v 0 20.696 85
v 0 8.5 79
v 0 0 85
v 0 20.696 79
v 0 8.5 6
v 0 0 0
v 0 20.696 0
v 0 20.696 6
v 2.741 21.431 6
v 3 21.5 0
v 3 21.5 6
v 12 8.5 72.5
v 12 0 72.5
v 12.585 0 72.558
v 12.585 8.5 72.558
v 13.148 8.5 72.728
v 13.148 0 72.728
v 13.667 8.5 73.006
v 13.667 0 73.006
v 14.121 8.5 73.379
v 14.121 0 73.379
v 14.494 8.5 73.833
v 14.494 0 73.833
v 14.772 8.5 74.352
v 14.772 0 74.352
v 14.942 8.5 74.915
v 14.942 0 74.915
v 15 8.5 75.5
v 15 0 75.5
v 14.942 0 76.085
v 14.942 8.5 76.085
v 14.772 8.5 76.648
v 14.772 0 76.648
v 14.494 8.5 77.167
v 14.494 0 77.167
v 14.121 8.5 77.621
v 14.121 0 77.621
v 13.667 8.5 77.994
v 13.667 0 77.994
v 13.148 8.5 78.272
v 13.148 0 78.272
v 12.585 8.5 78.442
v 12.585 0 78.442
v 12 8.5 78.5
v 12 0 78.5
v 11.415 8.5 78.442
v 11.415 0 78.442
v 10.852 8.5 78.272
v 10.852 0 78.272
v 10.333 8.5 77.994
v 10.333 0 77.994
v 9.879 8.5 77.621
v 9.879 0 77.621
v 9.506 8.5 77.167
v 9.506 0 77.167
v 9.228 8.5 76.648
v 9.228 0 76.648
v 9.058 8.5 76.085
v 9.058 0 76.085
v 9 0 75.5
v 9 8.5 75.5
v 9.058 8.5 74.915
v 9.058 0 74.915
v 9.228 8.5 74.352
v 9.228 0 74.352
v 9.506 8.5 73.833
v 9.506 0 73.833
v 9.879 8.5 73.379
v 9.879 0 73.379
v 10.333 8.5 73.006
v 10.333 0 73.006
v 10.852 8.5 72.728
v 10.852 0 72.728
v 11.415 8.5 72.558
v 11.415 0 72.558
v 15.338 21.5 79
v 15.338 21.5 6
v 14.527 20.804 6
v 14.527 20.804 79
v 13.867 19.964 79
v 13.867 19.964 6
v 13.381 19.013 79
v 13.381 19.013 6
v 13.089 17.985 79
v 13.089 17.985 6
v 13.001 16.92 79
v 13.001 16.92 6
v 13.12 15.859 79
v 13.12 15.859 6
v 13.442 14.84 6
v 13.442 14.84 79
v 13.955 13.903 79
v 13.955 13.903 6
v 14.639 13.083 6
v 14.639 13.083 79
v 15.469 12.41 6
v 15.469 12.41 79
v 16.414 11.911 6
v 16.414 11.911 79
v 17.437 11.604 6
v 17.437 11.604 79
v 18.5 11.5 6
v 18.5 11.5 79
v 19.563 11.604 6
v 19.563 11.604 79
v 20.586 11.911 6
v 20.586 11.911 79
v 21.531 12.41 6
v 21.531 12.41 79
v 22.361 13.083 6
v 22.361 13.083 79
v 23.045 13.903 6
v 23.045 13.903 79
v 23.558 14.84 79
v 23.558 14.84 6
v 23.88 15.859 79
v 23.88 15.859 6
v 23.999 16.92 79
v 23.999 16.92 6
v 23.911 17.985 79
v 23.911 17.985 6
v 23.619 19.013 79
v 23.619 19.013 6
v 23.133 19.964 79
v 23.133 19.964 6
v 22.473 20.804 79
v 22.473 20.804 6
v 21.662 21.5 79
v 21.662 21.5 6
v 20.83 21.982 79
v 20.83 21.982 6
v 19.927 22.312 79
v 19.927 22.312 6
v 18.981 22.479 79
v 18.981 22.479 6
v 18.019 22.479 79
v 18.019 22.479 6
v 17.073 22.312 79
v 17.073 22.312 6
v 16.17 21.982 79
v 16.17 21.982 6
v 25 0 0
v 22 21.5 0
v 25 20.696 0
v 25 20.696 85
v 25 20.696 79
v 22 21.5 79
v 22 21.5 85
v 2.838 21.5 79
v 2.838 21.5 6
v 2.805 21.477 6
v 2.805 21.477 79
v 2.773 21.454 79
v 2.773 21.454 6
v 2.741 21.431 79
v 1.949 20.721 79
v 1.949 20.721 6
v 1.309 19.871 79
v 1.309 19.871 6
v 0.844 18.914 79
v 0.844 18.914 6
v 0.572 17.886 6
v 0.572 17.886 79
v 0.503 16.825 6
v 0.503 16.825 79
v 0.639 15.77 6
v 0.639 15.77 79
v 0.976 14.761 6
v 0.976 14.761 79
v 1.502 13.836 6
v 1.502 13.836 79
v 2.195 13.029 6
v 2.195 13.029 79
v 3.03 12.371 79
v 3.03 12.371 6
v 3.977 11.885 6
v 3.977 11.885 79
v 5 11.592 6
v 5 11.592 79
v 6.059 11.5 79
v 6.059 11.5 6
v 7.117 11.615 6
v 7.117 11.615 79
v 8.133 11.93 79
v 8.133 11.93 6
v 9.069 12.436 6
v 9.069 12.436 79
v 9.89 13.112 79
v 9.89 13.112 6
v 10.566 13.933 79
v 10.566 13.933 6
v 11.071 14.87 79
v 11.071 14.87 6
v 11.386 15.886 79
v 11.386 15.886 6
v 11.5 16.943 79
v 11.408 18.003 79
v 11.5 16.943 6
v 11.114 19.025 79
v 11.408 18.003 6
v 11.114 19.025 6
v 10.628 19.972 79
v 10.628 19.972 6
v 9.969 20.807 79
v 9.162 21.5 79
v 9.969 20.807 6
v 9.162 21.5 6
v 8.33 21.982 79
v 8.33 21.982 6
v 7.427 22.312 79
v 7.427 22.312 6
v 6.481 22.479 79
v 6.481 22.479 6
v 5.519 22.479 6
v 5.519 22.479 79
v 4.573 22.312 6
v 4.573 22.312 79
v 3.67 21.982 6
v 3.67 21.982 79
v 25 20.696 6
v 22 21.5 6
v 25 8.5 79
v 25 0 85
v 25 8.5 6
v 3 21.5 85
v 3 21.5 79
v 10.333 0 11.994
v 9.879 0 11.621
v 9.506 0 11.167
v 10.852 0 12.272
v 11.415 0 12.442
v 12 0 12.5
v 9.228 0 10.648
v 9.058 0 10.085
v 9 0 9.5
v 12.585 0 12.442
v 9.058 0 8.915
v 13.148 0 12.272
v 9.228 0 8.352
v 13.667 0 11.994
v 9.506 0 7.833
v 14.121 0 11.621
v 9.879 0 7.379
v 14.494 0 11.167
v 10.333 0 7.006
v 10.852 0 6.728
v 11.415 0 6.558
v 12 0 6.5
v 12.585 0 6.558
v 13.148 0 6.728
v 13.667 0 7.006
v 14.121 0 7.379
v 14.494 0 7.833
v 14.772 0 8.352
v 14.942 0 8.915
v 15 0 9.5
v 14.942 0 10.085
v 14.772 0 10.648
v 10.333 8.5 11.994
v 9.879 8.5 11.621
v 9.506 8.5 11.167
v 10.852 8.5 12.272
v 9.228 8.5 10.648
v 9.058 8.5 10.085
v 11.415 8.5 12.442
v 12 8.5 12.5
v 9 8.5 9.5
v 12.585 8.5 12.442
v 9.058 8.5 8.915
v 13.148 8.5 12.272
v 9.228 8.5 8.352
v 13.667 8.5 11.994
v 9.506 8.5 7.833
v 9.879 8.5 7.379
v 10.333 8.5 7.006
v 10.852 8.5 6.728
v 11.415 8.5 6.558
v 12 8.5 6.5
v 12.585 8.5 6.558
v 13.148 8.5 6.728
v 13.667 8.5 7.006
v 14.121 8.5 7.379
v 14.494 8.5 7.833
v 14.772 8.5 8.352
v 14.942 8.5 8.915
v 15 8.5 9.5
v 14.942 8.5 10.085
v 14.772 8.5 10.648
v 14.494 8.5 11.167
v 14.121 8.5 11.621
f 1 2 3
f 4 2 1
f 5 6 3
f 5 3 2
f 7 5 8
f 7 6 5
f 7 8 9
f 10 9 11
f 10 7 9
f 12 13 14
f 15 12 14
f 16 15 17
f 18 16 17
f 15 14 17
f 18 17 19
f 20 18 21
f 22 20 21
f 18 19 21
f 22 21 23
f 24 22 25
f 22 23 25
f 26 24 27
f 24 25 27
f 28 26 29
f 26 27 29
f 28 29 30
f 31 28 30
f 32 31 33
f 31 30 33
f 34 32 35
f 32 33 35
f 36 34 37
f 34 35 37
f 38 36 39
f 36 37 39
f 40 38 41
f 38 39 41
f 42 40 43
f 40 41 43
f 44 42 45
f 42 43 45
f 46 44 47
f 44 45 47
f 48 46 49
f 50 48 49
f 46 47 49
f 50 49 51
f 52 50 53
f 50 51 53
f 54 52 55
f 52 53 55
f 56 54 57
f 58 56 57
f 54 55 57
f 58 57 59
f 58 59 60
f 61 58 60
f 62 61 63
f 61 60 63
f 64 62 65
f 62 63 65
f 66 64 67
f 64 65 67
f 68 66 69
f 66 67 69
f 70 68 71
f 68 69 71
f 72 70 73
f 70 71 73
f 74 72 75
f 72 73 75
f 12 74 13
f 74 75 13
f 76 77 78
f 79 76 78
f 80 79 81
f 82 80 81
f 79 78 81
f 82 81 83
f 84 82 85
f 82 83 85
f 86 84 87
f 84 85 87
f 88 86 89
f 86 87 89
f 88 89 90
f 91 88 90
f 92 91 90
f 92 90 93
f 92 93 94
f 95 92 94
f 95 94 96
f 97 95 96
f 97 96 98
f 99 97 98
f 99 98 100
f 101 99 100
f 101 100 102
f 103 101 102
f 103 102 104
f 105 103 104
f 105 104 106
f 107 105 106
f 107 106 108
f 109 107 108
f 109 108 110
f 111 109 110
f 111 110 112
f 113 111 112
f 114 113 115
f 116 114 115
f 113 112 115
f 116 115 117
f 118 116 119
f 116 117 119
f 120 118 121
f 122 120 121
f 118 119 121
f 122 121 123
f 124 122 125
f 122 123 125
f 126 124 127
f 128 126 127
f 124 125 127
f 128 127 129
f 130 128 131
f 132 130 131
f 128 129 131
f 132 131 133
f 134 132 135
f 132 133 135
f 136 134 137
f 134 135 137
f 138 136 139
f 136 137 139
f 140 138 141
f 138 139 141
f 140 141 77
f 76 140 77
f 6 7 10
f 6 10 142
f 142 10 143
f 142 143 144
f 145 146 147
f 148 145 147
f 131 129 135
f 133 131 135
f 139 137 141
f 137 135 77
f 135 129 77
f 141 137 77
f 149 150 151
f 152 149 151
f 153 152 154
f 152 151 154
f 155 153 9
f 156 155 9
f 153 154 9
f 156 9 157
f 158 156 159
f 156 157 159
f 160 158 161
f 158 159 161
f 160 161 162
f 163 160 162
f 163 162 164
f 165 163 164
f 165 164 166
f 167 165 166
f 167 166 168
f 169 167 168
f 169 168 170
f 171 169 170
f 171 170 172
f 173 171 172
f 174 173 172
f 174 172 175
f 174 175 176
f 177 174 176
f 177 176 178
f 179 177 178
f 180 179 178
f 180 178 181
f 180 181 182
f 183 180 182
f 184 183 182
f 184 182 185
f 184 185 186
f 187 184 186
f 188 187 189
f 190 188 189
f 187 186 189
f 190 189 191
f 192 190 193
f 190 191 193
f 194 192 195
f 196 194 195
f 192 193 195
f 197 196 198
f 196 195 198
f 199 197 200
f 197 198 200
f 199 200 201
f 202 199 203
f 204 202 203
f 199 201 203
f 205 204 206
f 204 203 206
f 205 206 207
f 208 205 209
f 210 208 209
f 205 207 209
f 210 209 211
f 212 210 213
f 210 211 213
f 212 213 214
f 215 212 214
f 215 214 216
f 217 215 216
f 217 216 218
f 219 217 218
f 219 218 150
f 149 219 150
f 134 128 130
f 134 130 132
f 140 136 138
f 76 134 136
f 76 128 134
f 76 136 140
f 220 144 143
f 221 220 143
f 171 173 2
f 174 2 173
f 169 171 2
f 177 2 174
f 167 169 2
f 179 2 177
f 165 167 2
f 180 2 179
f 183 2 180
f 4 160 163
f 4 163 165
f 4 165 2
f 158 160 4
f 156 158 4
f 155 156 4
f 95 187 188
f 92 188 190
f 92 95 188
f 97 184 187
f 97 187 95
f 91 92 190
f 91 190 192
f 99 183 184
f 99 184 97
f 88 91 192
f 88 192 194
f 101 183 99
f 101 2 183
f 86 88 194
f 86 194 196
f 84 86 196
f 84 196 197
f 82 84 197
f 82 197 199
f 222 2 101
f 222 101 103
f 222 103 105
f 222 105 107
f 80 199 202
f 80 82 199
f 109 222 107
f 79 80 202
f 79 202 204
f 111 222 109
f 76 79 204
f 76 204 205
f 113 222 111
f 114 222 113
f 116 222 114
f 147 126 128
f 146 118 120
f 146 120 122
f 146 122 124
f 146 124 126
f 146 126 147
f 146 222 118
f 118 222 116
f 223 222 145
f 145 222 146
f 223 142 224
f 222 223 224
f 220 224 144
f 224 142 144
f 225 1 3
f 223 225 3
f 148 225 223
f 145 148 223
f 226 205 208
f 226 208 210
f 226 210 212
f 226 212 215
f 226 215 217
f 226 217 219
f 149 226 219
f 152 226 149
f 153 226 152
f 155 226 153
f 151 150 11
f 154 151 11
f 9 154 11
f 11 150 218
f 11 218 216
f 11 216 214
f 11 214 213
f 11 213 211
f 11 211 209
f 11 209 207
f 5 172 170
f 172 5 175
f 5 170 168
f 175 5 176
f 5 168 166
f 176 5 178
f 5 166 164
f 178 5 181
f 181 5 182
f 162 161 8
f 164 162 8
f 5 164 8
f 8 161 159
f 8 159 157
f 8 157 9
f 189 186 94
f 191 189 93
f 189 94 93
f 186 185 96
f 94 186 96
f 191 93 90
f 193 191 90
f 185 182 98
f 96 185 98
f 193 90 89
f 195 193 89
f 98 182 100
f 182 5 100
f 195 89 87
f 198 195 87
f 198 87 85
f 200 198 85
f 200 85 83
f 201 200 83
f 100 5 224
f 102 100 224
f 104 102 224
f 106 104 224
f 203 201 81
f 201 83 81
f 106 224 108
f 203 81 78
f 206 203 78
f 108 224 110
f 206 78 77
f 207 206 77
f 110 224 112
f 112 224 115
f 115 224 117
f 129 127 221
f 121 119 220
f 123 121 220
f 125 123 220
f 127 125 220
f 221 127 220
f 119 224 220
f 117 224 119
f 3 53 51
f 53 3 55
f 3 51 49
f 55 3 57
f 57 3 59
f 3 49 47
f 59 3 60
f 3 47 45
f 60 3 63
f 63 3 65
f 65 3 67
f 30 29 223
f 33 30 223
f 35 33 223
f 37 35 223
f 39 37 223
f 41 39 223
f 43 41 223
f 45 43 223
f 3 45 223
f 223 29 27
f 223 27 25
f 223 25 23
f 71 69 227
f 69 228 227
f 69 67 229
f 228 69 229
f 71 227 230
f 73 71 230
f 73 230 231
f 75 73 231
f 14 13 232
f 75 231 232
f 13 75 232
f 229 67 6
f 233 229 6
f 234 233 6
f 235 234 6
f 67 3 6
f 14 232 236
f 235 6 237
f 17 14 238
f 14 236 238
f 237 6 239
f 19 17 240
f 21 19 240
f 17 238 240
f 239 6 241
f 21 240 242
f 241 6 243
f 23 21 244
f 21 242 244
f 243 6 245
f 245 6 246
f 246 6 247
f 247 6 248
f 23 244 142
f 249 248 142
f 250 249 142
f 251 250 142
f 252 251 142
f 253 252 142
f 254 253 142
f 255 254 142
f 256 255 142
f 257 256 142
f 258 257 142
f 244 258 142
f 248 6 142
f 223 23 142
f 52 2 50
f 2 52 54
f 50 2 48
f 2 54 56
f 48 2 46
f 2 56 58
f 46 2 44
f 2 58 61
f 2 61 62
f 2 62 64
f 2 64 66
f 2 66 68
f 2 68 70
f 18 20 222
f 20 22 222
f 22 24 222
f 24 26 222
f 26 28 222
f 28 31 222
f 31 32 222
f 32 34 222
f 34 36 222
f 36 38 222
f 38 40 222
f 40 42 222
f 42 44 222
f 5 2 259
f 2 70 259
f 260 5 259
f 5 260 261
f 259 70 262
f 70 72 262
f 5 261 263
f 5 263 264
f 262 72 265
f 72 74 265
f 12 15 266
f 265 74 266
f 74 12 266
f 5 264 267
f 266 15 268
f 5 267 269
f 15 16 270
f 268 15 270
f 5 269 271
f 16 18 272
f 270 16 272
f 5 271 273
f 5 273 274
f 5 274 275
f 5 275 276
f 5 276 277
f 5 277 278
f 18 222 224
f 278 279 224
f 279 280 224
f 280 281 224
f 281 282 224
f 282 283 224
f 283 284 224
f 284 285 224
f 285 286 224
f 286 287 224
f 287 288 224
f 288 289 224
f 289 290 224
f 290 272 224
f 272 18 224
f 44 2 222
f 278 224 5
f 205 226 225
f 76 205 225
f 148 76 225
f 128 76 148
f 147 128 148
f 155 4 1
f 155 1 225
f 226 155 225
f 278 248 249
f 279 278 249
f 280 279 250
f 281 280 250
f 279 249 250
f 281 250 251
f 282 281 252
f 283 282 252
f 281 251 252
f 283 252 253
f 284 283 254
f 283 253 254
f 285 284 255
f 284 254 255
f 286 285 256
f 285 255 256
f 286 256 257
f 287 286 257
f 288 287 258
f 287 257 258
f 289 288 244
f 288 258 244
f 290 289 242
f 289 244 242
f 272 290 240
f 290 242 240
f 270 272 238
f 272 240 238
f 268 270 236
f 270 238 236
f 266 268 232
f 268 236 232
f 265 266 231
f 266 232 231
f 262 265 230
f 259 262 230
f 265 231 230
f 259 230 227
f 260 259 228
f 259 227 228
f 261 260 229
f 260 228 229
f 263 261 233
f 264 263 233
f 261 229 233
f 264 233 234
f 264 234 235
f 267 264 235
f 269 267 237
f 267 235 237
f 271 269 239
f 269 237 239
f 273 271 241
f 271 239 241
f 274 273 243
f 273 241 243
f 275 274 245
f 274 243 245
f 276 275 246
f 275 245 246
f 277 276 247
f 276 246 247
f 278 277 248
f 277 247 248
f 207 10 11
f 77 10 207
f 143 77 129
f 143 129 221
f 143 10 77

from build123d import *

# Parameters (mm, degrees)
SCHIZZO1_W               = 25
SCHIZZO1_H               = 21.5
ESTRUSIONE1_DEPTH        = 85
SCHIZZO6_W               = 73
SCHIZZO6_H               = 23.639461627
TAGLIO_ESTRUSIONE4_DEPTH = 84
SCHIZZO7_R               = 5.5
ESTRUSIONE4_DEPTH        = 73
SMUSSO1_SIZE             = 0.803847577
SMUSSO1_SIZE_2           = 3
SCHIZZO8_R               = 3
TAGLIO_ESTRUSIONE5_DEPTH = 8.5


with BuildPart() as part:
    # Schizzo1 → Estrusione1 (new body)
    with BuildSketch(Plane.XY):
        with Locations((12.5, 10.75)):
            Rectangle(SCHIZZO1_W, SCHIZZO1_H)
    extrude(amount=ESTRUSIONE1_DEPTH)

    # Schizzo6 → Taglio-Estrusione4 (cut)
    with BuildSketch(Plane(origin=(25, 0, 0), x_dir=(0, 0, -1), z_dir=(1, 0, 0))):
        with Locations((-42.5, 20.319730814)):
            Rectangle(SCHIZZO6_W, SCHIZZO6_H)
    extrude(amount=-TAGLIO_ESTRUSIONE4_DEPTH, mode=Mode.SUBTRACT)

    # Schizzo7 → Estrusione4 (add)
    with BuildSketch(Plane.XY.offset(6)):
        with Locations(Location((6, 17, 0), (0, 0, 125.096801228))):
            Circle(SCHIZZO7_R)
        with Locations(Location((18.5, 17, 0), (0, 0, 125.096801228))):
            Circle(SCHIZZO7_R)
    extrude(amount=ESTRUSIONE4_DEPTH)

    # Smusso1
    # the kernel refuses this chamfer: 3, 0.803847577 mm, written as the material it takes off along each edge
    with BuildSketch(Plane(origin=(0, 21.5, -7.790164711), x_dir=(-0.13751244702128895, -0.9905000388259545, 0), z_dir=(0, 0, 1)), Plane(origin=(0, 21.5, 79), x_dir=(-0.13751244702128895, -0.9905000388259545, 0), z_dir=(0, 0, 1))) as smusso1_piece_1:
        Polygon((SMUSSO1_SIZE * 0.990500039187, SMUSSO1_SIZE * 0.137512447071), (-SMUSSO1_SIZE_2 * 0.137512447021, SMUSSO1_SIZE_2 * 0.990500038826), (0, 0), align=None)
    extrude(amount=13.790164711, mode=Mode.SUBTRACT)
    with BuildSketch(Plane(origin=(25, 21.5, -7.790164711), x_dir=(0.13751244702128734, -0.9905000388259546, 0), z_dir=(0, 0, 1)), Plane(origin=(25, 21.5, 71.209835289), x_dir=(0.13751244702128734, -0.9905000388259546, 0), z_dir=(0, 0, 1))) as smusso1_piece_2:
        Polygon((SMUSSO1_SIZE * 0.990500039187, -SMUSSO1_SIZE * 0.137512447071), (-SMUSSO1_SIZE_2 * 0.137512447021, -SMUSSO1_SIZE_2 * 0.990500038826), (0, 0), align=None)
    extrude(amount=21.580329421, mode=Mode.SUBTRACT)

    # Schizzo8 → Taglio-Estrusione5 (cut)
    with BuildSketch(Plane.XZ):
        with Locations(Location((12, 75.5, 0), (0, 0, 270))):
            Circle(SCHIZZO8_R)
        with Locations(Location((12, 9.5, 0), (0, 0, 270))):
            Circle(SCHIZZO8_R)
    extrude(amount=-TAGLIO_ESTRUSIONE5_DEPTH, mode=Mode.SUBTRACT)


solid = part.part
